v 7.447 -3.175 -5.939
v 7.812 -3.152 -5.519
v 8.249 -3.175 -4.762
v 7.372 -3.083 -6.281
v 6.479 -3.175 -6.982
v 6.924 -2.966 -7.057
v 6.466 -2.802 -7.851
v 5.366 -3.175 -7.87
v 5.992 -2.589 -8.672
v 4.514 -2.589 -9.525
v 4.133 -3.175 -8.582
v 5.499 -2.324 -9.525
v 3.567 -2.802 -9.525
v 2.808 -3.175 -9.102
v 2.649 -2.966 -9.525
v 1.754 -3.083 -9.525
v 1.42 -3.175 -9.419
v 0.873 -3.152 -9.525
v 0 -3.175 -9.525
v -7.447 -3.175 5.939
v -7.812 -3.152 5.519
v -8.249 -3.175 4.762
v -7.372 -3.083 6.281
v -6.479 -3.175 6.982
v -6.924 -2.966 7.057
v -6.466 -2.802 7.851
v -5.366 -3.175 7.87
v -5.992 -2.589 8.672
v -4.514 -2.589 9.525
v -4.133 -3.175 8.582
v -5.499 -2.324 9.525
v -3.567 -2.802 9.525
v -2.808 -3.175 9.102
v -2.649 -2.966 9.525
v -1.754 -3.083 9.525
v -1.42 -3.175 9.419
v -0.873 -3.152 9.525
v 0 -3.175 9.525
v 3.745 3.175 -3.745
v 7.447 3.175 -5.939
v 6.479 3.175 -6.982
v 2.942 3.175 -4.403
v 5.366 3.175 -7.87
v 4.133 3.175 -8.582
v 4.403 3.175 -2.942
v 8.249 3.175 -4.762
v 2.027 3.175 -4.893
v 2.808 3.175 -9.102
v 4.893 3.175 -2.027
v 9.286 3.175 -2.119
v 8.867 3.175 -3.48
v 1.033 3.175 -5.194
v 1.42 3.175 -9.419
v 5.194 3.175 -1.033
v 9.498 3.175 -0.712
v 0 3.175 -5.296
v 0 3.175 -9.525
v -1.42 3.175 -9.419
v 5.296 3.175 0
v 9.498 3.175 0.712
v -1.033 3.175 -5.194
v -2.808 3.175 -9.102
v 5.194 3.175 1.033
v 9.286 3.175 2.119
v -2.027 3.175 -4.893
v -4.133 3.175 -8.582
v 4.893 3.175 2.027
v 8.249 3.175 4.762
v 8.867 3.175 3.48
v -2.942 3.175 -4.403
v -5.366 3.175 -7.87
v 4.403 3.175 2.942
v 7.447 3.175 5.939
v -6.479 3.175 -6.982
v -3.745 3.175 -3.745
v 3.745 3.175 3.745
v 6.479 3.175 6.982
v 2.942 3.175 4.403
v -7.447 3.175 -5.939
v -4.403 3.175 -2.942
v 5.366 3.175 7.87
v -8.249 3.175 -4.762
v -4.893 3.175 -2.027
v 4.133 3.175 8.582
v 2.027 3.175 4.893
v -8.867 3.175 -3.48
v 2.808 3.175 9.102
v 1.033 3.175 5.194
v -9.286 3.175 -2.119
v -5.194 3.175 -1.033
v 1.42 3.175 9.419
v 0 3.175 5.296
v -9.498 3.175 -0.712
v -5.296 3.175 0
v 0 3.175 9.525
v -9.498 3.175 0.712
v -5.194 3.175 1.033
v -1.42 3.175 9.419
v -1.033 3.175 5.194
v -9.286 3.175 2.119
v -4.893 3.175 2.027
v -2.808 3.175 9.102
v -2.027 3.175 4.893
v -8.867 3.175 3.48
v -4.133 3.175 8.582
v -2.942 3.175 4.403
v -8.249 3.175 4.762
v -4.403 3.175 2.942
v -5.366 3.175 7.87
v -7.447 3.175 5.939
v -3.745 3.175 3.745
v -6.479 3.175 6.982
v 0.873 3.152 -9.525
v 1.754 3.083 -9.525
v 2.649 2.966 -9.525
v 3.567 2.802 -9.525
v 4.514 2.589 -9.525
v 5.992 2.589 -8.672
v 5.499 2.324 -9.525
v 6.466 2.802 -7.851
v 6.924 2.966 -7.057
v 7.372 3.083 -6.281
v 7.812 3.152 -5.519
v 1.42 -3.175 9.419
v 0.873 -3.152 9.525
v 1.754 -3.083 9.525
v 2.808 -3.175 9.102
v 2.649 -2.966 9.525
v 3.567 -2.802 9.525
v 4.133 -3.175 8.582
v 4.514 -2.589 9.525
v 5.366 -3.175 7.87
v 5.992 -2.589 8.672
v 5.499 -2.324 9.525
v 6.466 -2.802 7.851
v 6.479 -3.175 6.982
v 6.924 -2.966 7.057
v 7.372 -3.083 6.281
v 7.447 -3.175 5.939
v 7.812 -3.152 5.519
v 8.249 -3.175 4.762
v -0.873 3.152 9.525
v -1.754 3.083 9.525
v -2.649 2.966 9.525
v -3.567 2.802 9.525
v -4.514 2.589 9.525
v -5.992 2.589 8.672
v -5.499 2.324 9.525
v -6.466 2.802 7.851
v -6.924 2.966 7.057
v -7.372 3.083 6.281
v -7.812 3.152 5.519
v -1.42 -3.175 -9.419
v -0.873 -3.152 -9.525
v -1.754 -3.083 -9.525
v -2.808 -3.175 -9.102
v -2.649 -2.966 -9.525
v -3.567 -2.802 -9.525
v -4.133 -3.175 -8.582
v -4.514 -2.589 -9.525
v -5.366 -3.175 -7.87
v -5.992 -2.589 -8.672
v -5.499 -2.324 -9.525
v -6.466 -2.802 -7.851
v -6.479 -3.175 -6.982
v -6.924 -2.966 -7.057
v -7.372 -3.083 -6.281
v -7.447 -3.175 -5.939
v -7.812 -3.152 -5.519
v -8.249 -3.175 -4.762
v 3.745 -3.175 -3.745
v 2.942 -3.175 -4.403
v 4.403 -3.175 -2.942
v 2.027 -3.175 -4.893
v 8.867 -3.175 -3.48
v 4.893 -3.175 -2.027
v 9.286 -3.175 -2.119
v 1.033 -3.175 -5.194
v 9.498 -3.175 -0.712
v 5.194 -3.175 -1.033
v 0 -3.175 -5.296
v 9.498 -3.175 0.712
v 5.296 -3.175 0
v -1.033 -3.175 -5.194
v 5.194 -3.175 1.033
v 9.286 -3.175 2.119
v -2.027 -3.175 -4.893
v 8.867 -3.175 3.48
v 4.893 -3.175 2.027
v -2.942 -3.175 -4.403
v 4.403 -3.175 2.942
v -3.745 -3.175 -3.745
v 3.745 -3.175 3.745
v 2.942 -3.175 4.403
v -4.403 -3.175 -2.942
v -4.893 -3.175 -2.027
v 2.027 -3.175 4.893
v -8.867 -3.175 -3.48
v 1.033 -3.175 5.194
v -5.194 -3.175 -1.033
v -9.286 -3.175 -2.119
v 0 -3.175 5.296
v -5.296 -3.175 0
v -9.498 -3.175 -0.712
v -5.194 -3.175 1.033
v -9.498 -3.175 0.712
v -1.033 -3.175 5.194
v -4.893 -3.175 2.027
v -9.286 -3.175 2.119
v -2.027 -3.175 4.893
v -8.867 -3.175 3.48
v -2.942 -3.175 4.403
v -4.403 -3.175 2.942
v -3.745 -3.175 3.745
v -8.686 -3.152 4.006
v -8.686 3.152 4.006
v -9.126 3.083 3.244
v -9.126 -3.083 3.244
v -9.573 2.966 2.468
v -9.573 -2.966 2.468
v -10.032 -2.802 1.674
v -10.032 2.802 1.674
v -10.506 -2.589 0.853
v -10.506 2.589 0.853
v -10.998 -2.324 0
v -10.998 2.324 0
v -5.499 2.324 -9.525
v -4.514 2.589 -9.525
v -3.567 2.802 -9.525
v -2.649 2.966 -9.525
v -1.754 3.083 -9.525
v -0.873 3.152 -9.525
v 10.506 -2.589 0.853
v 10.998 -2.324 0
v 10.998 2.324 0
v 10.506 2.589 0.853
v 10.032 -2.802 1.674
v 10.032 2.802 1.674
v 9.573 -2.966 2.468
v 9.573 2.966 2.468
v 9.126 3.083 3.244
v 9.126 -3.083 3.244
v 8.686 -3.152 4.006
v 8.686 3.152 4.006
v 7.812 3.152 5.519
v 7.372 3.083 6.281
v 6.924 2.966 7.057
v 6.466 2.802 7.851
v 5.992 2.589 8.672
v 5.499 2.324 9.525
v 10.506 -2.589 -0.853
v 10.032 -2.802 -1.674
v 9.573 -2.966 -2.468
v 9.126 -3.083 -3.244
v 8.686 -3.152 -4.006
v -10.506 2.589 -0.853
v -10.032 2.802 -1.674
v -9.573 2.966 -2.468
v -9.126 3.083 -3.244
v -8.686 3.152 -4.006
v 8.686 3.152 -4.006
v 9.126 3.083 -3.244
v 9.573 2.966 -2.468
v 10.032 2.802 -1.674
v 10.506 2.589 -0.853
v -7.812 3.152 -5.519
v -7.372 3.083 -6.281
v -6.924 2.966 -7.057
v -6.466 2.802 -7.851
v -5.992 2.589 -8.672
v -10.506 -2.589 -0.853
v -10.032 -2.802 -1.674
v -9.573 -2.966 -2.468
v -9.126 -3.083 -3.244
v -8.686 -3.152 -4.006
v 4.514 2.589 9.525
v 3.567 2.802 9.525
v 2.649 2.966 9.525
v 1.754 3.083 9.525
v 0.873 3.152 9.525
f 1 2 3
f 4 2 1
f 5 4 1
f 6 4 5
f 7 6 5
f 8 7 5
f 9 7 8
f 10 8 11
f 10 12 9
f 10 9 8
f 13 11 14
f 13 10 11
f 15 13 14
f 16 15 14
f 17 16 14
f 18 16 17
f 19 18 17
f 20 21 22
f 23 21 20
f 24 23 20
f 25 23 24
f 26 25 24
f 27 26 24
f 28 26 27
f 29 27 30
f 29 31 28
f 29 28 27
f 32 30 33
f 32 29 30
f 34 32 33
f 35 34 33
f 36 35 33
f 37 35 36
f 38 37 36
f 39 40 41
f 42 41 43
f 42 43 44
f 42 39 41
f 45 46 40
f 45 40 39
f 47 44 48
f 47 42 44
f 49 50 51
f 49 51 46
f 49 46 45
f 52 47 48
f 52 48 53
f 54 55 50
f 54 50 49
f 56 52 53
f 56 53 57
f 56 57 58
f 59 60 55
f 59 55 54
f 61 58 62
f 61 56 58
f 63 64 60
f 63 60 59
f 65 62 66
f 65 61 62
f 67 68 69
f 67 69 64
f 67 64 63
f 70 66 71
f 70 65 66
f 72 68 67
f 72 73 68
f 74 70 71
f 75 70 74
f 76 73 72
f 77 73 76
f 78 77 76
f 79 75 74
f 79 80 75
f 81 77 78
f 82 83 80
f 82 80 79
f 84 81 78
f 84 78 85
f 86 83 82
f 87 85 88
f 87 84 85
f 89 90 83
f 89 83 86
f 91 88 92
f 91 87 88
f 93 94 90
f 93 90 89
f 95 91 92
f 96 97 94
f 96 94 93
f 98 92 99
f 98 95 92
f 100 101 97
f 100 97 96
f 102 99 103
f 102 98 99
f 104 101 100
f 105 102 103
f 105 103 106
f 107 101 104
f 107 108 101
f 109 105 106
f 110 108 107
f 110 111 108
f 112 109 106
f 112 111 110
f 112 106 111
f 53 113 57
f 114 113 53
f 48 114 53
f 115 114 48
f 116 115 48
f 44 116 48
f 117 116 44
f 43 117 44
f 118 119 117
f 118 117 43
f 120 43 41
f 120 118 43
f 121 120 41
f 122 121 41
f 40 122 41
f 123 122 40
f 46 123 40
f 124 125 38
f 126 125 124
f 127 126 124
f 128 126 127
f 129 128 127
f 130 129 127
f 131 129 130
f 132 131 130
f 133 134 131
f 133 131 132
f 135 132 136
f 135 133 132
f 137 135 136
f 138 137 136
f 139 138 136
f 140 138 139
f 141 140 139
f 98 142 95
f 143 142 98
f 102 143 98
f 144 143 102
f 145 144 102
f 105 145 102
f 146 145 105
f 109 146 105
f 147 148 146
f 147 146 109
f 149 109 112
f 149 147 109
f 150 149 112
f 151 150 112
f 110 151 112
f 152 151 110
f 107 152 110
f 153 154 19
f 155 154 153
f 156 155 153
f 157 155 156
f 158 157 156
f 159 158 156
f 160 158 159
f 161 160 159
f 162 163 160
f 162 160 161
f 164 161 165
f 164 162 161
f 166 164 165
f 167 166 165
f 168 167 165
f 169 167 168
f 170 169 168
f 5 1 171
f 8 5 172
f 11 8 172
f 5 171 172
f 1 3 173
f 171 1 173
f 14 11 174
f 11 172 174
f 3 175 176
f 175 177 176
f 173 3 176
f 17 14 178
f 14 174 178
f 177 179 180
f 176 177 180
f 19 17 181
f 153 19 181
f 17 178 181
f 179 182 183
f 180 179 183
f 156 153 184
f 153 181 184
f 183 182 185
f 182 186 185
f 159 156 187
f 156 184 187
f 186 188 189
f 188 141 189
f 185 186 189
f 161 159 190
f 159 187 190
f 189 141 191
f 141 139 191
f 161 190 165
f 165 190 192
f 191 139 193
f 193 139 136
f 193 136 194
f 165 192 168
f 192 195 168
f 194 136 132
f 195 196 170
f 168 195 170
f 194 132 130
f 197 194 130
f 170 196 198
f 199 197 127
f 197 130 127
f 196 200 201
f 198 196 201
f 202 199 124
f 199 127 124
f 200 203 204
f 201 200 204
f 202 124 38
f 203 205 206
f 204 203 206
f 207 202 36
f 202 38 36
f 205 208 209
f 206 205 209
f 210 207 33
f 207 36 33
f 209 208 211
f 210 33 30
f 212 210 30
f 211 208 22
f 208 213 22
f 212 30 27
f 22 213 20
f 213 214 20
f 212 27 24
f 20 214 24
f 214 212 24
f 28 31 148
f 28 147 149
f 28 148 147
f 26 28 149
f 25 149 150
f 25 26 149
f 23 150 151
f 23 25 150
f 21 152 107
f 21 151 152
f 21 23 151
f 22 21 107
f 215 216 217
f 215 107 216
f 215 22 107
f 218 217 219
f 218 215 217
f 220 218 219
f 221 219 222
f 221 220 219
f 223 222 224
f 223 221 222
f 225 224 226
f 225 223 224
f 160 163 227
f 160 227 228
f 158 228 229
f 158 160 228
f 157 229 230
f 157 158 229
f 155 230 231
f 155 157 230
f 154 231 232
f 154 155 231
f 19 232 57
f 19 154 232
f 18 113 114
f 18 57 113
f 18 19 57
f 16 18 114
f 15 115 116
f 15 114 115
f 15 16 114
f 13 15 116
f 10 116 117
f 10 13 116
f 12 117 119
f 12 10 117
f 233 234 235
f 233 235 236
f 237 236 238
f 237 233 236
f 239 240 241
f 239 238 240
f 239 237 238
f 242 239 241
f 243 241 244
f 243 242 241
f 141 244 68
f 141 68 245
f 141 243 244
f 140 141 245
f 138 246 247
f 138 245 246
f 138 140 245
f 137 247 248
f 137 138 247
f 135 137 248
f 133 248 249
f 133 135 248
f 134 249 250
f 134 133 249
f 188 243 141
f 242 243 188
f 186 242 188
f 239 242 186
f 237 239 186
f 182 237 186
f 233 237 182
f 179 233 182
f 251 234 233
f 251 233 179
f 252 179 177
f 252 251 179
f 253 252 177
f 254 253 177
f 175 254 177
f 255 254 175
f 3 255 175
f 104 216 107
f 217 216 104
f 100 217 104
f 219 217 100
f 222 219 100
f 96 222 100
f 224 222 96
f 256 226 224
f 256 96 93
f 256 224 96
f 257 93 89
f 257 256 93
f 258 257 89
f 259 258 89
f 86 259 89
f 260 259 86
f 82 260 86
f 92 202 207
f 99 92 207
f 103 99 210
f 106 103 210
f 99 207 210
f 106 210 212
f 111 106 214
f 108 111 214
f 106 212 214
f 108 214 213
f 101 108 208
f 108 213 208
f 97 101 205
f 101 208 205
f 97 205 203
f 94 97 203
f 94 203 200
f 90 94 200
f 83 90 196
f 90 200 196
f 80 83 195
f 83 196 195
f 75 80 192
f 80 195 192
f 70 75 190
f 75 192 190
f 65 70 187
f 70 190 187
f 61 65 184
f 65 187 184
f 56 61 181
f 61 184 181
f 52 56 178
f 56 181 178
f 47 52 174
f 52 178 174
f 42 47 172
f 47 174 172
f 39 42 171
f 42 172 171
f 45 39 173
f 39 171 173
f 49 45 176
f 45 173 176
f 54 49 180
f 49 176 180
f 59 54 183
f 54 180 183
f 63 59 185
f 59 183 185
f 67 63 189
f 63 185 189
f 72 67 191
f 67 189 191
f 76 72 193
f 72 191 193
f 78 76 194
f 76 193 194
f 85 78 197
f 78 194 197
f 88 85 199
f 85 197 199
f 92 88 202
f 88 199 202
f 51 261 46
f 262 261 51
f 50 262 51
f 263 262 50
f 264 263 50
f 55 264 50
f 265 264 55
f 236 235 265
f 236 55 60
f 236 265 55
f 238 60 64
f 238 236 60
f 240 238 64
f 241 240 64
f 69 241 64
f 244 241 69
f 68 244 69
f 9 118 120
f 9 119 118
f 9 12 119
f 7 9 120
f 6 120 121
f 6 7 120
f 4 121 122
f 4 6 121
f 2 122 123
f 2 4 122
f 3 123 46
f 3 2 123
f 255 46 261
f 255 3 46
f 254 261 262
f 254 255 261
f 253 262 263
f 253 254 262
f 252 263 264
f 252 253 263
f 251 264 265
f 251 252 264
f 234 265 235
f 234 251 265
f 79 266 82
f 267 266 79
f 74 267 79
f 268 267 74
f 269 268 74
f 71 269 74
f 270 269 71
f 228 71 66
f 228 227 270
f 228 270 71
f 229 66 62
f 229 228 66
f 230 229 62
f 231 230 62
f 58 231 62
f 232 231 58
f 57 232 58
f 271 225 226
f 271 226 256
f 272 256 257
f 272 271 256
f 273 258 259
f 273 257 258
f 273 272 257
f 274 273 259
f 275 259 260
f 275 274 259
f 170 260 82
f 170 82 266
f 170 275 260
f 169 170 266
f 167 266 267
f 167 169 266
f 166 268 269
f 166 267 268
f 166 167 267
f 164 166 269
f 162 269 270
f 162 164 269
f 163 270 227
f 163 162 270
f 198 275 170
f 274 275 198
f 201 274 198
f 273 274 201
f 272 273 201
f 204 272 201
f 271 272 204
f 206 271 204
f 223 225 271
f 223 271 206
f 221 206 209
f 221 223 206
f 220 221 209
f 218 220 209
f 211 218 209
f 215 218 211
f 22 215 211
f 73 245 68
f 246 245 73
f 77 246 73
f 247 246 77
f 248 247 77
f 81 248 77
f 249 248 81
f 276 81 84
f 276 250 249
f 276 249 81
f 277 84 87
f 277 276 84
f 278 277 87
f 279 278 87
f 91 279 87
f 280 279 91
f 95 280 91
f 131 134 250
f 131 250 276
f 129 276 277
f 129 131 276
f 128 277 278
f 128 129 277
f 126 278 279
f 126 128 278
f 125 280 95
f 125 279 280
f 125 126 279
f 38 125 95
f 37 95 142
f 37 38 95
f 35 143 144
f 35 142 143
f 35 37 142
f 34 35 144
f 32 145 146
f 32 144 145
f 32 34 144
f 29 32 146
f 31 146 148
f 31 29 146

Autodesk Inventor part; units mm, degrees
ref_plane "YZ Plane" through (0, 0, 0) normal (1, 0, 0) x (0, 1, 0)
ref_plane "XZ Plane" through (0, 0, 0) normal (0, 1, 0) x (-1, 0, 0)
ref_plane "XY Plane" through (0, 0, 0) normal (0, 0, 1) x (1, 0, 0)
sketch "Sketch3" plane through (0, 0, 0) normal (0, 1, 0) x (-1, 0, 0)
  line L0 (10.9985, 0) -> (5.4993, -9.525)
  line L1 (5.4993, -9.525) -> (-5.4993, -9.525)
  line L2 (-5.4993, -9.525) -> (-10.9985, 0)
  line L3 (-10.9985, 0) -> (-5.4993, 9.525)
  line L4 (-5.4993, 9.525) -> (5.4993, 9.525)
  line L5 (5.4993, 9.525) -> (10.9985, 0)
  point P0 (0, 0)
  point P1 (0, 0)
  point P2 (0, 0)
  dimension "d27" = 19.05
extrude "Extrusion2" add sketch "Sketch3" along normal mid plane 6.35
sketch "Sketch5" plane through (0, 0, 0) normal (0, 0, 1) x (1, 0, 0)
  line L0 (0, -8.89) -> (0, 8.89) projected
  line L1 (10.9985, 3.175) -> (5.4993, 3.175) construction
  line L2 (5.4993, 3.175) -> (5.4993, -3.175) projected
  line L3 (10.9985, 3.175) -> (5.4993, 3.175) projected
  line L4 (10.9985, 3.175) -> (10.9985, -3.175) construction
  line L5 (5.4993, -3.175) -> (10.9985, -3.175) projected
  line L6 (9.525, 3.175) -> (10.9985, 3.175)
  line L7 (10.9985, 3.175) -> (10.9985, 2.3243)
  line L8 (10.9985, 2.3243) -> (9.525, 3.175)
  line L9 (0, 0) -> (14.3088, 0) construction
  line L10 (9.525, -3.175) -> (10.9985, -3.175)
  line L11 (10.9985, -3.175) -> (10.9985, -2.3243)
  line L12 (10.9985, -2.3243) -> (9.525, -3.175)
  dimension "d15" = 19.05
  dimension "d16" = 30
revolve "Revolution3" cut sketch "Sketch5" angle 360 about axis through (0, -10, 0) along (0, 1, 0)
hole "Hole1" at (0, 3.175, 0) direction (0, -1, 0) diameter 10.5918 end through all thread size "1/2-13 UNC" class "2B" standard "ANSI Unified Screw Threads"
equation "\"diameter\" = 25.4"
equation "\"length\" = 76.2"
properties part number "Door Plate Nut" material "Steel, Carbon"
